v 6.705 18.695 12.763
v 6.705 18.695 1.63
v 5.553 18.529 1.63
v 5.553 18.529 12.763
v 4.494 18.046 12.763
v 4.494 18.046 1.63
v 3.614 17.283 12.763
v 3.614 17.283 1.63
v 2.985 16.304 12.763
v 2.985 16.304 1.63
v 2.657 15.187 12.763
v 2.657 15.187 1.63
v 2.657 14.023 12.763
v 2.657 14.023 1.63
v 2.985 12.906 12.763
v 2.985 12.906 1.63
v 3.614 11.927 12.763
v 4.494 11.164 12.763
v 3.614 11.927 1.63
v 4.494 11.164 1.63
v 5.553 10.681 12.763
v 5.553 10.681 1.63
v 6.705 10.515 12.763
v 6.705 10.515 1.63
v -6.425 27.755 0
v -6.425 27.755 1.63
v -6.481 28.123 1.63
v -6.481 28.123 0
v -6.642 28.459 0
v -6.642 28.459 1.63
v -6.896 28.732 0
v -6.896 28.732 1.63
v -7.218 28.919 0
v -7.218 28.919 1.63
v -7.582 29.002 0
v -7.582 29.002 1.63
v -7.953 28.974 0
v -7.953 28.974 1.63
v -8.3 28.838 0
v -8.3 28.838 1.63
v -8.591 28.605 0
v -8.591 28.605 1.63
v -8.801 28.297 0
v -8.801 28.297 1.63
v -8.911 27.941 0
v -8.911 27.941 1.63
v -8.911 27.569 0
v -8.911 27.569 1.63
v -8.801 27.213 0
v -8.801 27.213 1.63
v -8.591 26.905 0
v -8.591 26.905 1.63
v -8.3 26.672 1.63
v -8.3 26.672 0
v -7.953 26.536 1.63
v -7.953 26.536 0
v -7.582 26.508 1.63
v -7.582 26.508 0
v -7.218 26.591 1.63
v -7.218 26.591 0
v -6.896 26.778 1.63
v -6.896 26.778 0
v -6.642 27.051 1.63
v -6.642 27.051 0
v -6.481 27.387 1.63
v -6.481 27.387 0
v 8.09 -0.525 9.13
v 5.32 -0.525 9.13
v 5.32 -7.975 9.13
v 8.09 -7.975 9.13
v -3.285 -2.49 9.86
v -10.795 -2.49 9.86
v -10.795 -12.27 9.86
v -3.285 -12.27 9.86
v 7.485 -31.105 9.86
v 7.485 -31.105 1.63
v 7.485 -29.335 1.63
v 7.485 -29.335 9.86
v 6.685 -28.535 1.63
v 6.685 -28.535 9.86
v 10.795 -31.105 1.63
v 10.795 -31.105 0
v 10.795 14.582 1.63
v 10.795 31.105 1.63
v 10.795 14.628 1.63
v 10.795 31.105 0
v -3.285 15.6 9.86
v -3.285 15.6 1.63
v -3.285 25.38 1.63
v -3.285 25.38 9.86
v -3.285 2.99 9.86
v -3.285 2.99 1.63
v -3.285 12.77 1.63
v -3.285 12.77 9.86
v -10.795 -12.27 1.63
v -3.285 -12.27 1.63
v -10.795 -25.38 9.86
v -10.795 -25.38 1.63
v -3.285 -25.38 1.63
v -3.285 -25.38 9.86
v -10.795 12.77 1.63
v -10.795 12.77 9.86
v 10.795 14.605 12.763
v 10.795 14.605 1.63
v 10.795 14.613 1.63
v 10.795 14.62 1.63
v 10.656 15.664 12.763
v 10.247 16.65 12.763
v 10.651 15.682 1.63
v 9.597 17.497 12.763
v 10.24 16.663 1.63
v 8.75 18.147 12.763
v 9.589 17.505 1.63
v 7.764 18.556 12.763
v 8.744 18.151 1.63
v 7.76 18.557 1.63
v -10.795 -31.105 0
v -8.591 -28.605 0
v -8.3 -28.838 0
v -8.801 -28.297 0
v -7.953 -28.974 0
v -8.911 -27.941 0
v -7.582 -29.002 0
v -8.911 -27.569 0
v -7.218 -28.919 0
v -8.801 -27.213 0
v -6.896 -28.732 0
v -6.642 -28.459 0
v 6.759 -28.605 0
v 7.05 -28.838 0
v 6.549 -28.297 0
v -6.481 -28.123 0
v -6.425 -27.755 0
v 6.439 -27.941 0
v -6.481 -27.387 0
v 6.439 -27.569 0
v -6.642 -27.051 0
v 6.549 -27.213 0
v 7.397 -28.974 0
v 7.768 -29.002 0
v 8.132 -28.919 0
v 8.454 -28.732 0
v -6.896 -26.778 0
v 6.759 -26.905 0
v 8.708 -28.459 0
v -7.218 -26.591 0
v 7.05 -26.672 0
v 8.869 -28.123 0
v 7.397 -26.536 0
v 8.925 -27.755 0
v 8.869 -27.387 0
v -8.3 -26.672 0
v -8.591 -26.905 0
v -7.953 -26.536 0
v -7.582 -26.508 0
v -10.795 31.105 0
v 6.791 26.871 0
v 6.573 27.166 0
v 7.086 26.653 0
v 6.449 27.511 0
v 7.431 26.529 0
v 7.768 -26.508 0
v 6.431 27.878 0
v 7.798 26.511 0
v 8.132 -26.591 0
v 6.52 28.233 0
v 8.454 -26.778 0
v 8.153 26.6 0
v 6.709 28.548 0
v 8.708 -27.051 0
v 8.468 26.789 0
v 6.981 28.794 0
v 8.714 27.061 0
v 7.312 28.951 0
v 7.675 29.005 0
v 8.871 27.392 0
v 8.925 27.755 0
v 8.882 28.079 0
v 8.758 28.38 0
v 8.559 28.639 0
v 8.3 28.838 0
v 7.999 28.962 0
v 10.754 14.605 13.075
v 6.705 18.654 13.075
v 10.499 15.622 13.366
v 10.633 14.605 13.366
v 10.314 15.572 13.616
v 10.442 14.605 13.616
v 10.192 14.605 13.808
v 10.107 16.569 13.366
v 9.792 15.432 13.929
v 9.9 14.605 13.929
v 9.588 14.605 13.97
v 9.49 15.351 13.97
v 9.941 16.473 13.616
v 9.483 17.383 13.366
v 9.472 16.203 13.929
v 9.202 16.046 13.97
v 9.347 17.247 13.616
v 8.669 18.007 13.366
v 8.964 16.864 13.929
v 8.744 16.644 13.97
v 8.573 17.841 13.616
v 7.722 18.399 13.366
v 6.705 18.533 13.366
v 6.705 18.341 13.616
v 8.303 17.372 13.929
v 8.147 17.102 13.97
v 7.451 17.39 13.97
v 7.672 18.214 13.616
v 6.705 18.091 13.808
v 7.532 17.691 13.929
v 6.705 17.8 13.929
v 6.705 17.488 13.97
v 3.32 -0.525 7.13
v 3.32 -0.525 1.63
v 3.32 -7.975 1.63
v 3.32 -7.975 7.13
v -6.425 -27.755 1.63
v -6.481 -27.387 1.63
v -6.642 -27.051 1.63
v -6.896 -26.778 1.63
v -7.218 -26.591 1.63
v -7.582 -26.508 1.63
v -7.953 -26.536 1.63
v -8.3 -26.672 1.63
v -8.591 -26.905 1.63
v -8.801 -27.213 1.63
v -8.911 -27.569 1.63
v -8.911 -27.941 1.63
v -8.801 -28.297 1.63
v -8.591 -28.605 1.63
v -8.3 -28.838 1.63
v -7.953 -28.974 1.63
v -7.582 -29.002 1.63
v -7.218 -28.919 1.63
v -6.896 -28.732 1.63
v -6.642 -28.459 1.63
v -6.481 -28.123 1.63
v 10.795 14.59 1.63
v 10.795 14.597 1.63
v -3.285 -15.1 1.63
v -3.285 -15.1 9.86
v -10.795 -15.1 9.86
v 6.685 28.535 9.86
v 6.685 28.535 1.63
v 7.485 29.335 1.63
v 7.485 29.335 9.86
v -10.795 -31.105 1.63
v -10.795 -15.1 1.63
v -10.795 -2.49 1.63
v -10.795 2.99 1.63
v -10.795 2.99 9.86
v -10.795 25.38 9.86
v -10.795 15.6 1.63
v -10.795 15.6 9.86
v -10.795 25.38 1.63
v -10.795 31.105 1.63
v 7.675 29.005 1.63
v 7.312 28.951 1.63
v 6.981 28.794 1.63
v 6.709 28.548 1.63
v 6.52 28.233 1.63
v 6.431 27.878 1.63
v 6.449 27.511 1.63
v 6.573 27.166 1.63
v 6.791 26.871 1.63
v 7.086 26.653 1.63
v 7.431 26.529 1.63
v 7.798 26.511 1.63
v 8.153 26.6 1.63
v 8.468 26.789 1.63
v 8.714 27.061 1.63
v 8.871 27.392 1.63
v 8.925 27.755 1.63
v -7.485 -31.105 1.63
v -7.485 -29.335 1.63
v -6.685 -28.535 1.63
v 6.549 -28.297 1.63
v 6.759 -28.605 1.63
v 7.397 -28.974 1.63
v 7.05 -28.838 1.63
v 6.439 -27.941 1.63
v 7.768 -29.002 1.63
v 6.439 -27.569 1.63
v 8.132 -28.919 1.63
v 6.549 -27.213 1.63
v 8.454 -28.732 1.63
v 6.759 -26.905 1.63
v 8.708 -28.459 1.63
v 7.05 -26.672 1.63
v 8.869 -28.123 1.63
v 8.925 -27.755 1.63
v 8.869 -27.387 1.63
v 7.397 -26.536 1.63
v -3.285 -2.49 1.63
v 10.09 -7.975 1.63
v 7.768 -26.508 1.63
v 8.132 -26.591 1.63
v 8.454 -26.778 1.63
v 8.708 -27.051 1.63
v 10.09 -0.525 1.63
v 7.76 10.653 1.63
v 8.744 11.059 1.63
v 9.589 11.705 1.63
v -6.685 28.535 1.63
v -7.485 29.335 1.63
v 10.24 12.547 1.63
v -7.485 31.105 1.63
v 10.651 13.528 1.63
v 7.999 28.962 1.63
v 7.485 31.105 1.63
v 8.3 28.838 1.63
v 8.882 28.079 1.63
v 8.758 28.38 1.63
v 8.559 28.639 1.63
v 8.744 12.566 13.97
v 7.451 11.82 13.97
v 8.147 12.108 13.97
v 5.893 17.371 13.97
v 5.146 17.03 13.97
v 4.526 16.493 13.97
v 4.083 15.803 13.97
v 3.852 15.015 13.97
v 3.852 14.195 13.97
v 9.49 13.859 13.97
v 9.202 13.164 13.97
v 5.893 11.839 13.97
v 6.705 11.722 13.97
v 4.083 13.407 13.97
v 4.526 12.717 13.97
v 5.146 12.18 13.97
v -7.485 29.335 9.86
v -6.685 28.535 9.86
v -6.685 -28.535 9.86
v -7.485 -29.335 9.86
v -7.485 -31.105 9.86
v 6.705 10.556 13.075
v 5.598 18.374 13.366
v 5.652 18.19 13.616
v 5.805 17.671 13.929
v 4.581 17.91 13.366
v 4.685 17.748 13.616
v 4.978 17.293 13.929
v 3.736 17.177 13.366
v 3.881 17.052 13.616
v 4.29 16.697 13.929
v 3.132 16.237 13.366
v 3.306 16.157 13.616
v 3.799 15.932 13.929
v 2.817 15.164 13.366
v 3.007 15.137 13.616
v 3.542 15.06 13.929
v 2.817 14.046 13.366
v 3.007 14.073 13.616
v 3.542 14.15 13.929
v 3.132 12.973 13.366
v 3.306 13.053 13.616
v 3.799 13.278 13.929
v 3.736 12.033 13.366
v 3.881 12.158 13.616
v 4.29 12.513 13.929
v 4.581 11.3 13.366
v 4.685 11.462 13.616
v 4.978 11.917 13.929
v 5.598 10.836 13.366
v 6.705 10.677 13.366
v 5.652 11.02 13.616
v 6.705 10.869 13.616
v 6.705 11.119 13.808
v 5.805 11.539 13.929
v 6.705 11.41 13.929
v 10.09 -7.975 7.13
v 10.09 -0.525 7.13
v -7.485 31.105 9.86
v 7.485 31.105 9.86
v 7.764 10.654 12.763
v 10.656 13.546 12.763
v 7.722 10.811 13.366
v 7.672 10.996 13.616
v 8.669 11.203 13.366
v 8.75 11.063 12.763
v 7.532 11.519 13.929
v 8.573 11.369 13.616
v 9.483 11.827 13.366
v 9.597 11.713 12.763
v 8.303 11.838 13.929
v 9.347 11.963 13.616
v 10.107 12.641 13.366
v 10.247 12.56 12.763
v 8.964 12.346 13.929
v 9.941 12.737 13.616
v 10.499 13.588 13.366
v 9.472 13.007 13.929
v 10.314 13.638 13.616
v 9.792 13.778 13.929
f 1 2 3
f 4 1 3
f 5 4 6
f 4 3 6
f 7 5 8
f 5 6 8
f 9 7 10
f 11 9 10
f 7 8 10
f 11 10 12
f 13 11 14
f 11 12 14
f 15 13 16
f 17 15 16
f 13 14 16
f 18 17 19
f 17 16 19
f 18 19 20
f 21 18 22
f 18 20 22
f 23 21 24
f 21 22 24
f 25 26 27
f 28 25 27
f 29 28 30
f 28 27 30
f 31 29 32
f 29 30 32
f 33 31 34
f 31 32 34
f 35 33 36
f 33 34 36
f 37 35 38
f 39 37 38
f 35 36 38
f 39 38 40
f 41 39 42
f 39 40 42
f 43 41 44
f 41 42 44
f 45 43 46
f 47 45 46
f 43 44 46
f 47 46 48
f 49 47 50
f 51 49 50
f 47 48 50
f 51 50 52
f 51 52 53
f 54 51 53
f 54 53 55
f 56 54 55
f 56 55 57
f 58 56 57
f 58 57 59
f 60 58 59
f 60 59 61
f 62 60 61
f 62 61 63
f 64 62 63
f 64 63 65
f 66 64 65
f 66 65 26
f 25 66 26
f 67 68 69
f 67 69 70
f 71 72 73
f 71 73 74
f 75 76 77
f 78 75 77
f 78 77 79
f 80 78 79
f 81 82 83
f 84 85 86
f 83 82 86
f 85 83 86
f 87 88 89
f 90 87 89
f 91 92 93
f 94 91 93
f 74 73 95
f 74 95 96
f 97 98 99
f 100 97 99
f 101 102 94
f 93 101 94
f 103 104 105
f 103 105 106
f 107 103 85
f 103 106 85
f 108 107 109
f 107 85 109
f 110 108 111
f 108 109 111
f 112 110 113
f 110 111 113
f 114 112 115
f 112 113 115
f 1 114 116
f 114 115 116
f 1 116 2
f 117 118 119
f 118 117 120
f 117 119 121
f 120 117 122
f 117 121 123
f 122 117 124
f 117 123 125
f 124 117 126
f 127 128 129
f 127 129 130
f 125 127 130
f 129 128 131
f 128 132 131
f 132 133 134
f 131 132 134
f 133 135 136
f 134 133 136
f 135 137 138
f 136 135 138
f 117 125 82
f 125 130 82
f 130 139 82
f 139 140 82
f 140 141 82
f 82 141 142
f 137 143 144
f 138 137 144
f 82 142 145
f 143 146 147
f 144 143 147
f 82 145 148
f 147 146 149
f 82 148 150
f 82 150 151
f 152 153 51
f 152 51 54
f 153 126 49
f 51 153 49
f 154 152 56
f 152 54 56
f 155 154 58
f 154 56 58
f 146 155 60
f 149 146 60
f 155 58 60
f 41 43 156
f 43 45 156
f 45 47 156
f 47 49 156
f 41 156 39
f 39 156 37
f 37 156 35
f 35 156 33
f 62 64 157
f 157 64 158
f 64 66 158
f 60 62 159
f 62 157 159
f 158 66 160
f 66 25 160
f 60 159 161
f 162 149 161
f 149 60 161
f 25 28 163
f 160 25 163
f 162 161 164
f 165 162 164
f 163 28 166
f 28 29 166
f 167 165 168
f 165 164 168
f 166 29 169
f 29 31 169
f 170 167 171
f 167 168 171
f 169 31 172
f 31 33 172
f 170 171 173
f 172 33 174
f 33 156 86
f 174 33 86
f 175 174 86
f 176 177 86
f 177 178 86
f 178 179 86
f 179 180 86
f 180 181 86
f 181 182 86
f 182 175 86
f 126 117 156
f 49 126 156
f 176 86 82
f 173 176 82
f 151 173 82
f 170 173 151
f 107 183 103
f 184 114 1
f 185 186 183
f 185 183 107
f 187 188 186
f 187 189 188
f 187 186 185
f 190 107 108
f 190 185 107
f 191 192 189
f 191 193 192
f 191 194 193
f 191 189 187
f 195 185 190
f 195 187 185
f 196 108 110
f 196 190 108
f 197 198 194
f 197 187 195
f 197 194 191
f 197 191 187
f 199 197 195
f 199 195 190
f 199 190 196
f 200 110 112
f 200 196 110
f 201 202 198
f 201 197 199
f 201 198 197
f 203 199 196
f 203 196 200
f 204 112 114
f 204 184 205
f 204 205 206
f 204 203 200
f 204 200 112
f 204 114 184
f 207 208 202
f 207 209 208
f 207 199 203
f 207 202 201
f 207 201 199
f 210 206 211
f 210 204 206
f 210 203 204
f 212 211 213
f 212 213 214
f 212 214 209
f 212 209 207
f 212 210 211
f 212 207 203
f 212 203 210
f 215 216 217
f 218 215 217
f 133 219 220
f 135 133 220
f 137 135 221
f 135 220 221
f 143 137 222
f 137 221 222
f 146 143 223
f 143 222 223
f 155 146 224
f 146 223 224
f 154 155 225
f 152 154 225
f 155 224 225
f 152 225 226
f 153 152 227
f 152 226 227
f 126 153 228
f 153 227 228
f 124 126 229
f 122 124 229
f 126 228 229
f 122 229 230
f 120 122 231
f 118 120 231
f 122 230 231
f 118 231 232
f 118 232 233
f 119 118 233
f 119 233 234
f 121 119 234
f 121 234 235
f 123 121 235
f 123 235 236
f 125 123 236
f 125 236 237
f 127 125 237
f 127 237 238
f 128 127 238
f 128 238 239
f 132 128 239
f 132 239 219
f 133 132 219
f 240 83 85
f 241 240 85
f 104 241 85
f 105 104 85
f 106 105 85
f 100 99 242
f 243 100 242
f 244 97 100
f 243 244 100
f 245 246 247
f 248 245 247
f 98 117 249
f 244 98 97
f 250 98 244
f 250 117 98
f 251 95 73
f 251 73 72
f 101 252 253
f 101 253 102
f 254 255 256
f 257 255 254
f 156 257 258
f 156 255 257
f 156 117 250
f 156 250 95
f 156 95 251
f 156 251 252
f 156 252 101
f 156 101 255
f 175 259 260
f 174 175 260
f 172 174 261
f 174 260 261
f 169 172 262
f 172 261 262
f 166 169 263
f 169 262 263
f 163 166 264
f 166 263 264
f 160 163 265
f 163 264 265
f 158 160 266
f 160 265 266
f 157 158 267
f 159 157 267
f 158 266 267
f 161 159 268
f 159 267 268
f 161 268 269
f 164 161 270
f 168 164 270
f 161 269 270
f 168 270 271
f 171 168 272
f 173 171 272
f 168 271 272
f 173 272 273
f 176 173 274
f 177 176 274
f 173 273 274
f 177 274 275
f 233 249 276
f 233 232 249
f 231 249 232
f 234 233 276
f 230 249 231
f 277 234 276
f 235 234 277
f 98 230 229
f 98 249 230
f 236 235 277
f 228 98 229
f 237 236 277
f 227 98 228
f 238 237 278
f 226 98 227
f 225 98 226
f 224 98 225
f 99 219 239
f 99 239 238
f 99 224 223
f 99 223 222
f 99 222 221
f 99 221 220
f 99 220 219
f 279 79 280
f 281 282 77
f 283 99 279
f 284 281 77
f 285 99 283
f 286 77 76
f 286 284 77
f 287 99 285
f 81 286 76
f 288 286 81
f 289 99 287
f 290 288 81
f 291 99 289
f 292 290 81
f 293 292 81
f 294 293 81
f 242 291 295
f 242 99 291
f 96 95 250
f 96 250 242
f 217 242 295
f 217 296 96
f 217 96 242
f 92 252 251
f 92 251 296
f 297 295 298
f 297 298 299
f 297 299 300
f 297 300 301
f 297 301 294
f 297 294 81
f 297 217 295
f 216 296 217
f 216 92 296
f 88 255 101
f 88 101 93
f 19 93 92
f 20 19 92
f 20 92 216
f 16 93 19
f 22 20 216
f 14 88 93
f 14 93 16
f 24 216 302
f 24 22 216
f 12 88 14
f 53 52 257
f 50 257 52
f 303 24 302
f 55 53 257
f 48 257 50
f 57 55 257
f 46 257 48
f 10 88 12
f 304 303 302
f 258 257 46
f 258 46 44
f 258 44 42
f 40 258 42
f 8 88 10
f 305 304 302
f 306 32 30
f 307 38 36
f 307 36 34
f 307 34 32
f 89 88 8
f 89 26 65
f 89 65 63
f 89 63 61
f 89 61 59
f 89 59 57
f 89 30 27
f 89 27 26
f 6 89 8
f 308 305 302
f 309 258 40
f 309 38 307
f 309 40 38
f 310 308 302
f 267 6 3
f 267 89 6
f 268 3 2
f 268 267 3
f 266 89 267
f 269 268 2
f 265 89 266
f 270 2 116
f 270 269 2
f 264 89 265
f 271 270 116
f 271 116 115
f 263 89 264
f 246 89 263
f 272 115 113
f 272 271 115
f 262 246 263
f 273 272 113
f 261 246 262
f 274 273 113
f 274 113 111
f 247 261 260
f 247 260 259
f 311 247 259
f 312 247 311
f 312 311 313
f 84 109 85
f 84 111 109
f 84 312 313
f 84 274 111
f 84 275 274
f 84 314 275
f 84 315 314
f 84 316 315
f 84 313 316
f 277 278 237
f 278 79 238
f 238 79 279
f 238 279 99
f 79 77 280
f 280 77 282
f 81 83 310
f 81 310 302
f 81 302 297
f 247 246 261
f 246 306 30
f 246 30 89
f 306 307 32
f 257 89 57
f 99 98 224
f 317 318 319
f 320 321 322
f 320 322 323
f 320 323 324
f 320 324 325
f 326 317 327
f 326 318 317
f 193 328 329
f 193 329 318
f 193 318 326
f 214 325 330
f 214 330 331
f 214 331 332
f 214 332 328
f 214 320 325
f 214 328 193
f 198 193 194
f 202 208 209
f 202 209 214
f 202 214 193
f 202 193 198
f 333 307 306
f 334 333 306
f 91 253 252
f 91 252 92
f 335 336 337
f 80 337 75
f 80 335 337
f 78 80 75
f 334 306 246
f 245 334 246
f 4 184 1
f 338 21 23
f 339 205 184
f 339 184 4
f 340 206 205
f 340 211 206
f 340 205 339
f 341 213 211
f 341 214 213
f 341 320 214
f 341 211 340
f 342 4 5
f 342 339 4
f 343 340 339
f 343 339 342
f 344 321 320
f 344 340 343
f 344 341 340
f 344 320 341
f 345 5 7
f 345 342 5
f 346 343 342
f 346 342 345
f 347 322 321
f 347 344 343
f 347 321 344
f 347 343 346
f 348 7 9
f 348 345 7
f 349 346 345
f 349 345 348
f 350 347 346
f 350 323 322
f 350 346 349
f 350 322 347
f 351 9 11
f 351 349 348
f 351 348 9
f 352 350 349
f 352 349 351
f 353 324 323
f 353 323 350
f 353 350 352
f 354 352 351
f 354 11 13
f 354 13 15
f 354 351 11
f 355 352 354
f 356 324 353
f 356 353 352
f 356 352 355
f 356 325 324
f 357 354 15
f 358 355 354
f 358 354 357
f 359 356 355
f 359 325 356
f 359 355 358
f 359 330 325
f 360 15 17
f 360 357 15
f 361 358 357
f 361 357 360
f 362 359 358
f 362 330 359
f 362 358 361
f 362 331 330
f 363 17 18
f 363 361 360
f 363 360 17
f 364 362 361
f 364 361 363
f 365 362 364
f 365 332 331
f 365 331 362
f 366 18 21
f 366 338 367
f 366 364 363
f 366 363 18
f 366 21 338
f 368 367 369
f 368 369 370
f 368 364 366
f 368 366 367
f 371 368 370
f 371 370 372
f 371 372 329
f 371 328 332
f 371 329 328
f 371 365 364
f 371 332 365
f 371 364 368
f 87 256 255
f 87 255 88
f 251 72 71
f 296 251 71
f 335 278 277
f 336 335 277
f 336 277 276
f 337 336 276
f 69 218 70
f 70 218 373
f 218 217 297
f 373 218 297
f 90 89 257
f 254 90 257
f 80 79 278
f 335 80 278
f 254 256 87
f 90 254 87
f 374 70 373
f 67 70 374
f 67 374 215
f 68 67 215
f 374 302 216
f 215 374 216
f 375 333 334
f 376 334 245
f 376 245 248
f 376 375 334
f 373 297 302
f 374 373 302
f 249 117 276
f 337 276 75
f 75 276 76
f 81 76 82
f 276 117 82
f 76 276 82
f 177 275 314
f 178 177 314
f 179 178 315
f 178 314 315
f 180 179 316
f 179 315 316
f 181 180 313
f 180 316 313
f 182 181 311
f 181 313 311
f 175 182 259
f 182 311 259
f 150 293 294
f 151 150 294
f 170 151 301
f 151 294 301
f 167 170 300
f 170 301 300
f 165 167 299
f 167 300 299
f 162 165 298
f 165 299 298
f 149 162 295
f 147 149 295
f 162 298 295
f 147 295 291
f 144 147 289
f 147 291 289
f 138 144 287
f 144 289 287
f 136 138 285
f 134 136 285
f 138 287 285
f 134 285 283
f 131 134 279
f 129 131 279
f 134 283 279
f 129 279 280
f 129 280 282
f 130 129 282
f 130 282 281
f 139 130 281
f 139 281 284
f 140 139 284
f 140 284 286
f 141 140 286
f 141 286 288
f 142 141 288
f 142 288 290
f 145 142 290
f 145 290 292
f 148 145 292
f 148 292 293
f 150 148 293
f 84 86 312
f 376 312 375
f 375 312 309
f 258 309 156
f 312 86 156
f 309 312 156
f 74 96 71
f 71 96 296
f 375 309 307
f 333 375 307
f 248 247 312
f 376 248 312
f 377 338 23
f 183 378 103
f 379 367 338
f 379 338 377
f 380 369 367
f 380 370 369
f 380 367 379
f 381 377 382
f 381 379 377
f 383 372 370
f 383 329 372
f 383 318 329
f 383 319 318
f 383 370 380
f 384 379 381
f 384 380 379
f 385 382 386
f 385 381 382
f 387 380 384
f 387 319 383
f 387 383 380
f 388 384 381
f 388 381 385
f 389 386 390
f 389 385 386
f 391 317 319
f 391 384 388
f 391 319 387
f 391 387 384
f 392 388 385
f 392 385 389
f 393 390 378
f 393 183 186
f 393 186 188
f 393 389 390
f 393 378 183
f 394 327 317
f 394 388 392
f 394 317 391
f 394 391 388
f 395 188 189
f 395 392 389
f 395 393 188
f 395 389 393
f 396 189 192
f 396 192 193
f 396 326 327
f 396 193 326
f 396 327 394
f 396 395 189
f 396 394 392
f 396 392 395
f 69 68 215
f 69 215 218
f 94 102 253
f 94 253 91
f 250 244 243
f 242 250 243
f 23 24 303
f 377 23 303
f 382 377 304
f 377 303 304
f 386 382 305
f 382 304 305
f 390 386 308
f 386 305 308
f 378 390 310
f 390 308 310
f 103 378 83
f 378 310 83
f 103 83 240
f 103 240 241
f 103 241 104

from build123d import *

# Parameters (mm, degrees)
F0_W         = 21.59
F0_H         = 62.21
F1_DEPTH     = 1.63
F4_DEPTH     = 12.34
F5_DEPTH     = 7.5
F2_R         = 1.25
F6_DEPTH     = 25
F7_SIZE      = 2
F8_R         = 1.2071067812
F10_DEPTH    = 8.23
F12_DEPTH    = 8.23
F13_T1_DEPTH = 10.2873463904
F14_W        = 7.51
F14_H        = 2.83
F14_H_2      = 5.48
F15_DEPTH    = 8.23


# Not quite as in the source:
# - a fillet or chamfer that OpenCascade refuses, or shapes differently, is made with other operations: its cross-section is extruded or revolved along the edge and cut away or added


with BuildPart() as f1:
    # F0 (on Top) → F1 (new body)
    with BuildSketch(Plane.XY):
        Rectangle(F0_W, F0_H)
    extrude(amount=F1_DEPTH)

    # F3 (on face) → F4 (join)
    with BuildSketch(Plane.XY.offset(1.63)):
        with BuildLine():
            ThreePointArc((10.7950629295, 14.605), (9.5971296646, 17.4970667351), (6.7050629295, 18.695))
            ThreePointArc((6.7050629295, 18.695), (2.6150629295, 14.605), (6.7050629295, 10.515))
            ThreePointArc((6.7050629295, 10.515), (9.5971296646, 11.7129332649), (10.7950629295, 14.605))
        make_face()
    extrude(amount=F4_DEPTH)

    # F3 (on face) → F5 (join)
    with BuildSketch(Plane.XY.offset(1.63)):
        Polygon((10.0900629295, -0.525), (6.7050629295, -0.525), (3.3200629295, -0.525), (3.3200629295, -7.975), (10.0900629295, -7.975), align=None)
    extrude(amount=F5_DEPTH)

    # F2 (on face) → F6 (cut)
    with BuildSketch(Plane.XY.offset(1.63)):
        with BuildLine():
            ThreePointArc((7.675, 29.005), (6.7911165235, 26.8711165235), (8.925, 27.755))
            Line((8.925, 27.755), (7.675, 27.755))
            Line((7.675, 27.755), (7.675, 29.005))
        make_face()
        with BuildLine():
            Line((7.675, 27.755), (8.925, 27.755))
            ThreePointArc((8.925, 27.755), (8.5588834765, 28.6388834765), (7.675, 29.005))
            Line((7.675, 29.005), (7.675, 27.755))
        make_face()
        with Locations((-7.675, 27.755)):
            Circle(F2_R)
        with Locations((-7.675, -27.755)):
            Circle(F2_R)
        with Locations((7.675, -27.755)):
            Circle(F2_R)
    extrude(amount=-F6_DEPTH, mode=Mode.SUBTRACT)

    # F7
    f7_edges = [f1.edges().sort_by_distance(p)[0] for p in [
        (3.320063, -4.25, 9.13),
        (10.090063, -4.25, 9.13),
    ]]
    chamfer(f7_edges, length=F7_SIZE)

    # F8
    f8_edges = [f1.edges().sort_by_distance(p)[0] for p in [
        (6.705063, 18.695, 13.97),
    ]]
    fillet(f8_edges, radius=F8_R)

    # F9 (on face) → F10 (join)
    with BuildSketch(Plane.XY.offset(1.63)):
        Polygon((-10.795, 25.38), (-10.795, 0), (-10.795, -25.38), (-3.285, -25.38), (-3.285, 25.38), align=None)
    extrude(amount=F10_DEPTH)

    # F11 (on face) → F12 (join)
    with BuildSketch(Plane.XY.offset(1.63)):
        with BuildLine():
            Line((7.485, 31.105), (0, 31.105))
            Line((0, 31.105), (-7.485, 31.105))
            Line((-7.485, 31.105), (-7.485, 28.9904756169))
            ThreePointArc((-7.485, 28.9904756169), (-7.0487343616, 28.8368000509), (-6.6982195743, 28.535))
            Line((-6.6982195743, 28.535), (6.6982195743, 28.535))
            ThreePointArc((6.6982195743, 28.535), (7.0487343616, 28.8368000509), (7.485, 28.9904756169))
            Line((7.485, 28.9904756169), (7.485, 31.105))
        make_face()
        with BuildLine():
            Line((7.485, 28.535), (7.485, 28.9904756169))
            ThreePointArc((7.485, 28.9904756169), (7.0487343616, 28.8368000509), (6.6982195743, 28.535))
            Line((6.6982195743, 28.535), (7.485, 28.535))
        make_face()
        with BuildLine():
            ThreePointArc((-6.6982195743, 28.535), (-7.0487343616, 28.8368000509), (-7.485, 28.9904756169))
            Line((-7.485, 28.9904756169), (-7.485, 28.535))
            Line((-7.485, 28.535), (-6.6982195743, 28.535))
        make_face()
        with BuildLine():
            Line((0, -31.105), (7.485, -31.105))
            Line((7.485, -31.105), (7.485, -28.9904756169))
            ThreePointArc((7.485, -28.9904756169), (7.0487343616, -28.8368000509), (6.6982195743, -28.535))
            Line((6.6982195743, -28.535), (-6.6982195743, -28.535))
            ThreePointArc((-6.6982195743, -28.535), (-7.0487343616, -28.8368000509), (-7.485, -28.9904756169))
            Line((-7.485, -28.9904756169), (-7.485, -31.105))
            Line((-7.485, -31.105), (0, -31.105))
        make_face()
        with BuildLine():
            ThreePointArc((6.6982195743, -28.535), (7.0487343616, -28.8368000509), (7.485, -28.9904756169))
            Line((7.485, -28.9904756169), (7.485, -28.535))
            Line((7.485, -28.535), (6.6982195743, -28.535))
        make_face()
        with BuildLine():
            Line((-7.485, -28.535), (-7.485, -28.9904756169))
            ThreePointArc((-7.485, -28.9904756169), (-7.0487343616, -28.8368000509), (-6.6982195743, -28.535))
            Line((-6.6982195743, -28.535), (-7.485, -28.535))
        make_face()
    extrude(amount=F12_DEPTH)

    # F13: chamfer of 0.8 on 4 edges, made by hand

    # F13_s2 → F13_t1 (cut)
    with BuildSketch(Plane.XY.offset(1.63)):
        Polygon((-7.485, 29.335), (-6.685, 28.535), (-7.485, 28.535), align=None)
        Polygon((6.685, 28.535), (7.485, 29.335), (7.485, 28.535), align=None)
        Polygon((-6.685, -28.535), (-7.485, -29.335), (-7.485, -28.535), align=None)
        Polygon((7.485, -29.335), (6.685, -28.535), (7.485, -28.535), align=None)
    extrude(amount=F13_T1_DEPTH, mode=Mode.SUBTRACT)

    # F14 (on face) → F15 (cut)
    with BuildSketch(Plane.XY.offset(9.86)):
        with Locations((-7.04, 14.185)):
            Rectangle(F14_W, F14_H)
        with Locations((-7.04, 0.25)):
            Rectangle(F14_W, F14_H_2)
        with Locations((-7.04, -13.685)):
            Rectangle(F14_W, F14_H)
    extrude(amount=-F15_DEPTH, mode=Mode.SUBTRACT)


solid = f1.part
